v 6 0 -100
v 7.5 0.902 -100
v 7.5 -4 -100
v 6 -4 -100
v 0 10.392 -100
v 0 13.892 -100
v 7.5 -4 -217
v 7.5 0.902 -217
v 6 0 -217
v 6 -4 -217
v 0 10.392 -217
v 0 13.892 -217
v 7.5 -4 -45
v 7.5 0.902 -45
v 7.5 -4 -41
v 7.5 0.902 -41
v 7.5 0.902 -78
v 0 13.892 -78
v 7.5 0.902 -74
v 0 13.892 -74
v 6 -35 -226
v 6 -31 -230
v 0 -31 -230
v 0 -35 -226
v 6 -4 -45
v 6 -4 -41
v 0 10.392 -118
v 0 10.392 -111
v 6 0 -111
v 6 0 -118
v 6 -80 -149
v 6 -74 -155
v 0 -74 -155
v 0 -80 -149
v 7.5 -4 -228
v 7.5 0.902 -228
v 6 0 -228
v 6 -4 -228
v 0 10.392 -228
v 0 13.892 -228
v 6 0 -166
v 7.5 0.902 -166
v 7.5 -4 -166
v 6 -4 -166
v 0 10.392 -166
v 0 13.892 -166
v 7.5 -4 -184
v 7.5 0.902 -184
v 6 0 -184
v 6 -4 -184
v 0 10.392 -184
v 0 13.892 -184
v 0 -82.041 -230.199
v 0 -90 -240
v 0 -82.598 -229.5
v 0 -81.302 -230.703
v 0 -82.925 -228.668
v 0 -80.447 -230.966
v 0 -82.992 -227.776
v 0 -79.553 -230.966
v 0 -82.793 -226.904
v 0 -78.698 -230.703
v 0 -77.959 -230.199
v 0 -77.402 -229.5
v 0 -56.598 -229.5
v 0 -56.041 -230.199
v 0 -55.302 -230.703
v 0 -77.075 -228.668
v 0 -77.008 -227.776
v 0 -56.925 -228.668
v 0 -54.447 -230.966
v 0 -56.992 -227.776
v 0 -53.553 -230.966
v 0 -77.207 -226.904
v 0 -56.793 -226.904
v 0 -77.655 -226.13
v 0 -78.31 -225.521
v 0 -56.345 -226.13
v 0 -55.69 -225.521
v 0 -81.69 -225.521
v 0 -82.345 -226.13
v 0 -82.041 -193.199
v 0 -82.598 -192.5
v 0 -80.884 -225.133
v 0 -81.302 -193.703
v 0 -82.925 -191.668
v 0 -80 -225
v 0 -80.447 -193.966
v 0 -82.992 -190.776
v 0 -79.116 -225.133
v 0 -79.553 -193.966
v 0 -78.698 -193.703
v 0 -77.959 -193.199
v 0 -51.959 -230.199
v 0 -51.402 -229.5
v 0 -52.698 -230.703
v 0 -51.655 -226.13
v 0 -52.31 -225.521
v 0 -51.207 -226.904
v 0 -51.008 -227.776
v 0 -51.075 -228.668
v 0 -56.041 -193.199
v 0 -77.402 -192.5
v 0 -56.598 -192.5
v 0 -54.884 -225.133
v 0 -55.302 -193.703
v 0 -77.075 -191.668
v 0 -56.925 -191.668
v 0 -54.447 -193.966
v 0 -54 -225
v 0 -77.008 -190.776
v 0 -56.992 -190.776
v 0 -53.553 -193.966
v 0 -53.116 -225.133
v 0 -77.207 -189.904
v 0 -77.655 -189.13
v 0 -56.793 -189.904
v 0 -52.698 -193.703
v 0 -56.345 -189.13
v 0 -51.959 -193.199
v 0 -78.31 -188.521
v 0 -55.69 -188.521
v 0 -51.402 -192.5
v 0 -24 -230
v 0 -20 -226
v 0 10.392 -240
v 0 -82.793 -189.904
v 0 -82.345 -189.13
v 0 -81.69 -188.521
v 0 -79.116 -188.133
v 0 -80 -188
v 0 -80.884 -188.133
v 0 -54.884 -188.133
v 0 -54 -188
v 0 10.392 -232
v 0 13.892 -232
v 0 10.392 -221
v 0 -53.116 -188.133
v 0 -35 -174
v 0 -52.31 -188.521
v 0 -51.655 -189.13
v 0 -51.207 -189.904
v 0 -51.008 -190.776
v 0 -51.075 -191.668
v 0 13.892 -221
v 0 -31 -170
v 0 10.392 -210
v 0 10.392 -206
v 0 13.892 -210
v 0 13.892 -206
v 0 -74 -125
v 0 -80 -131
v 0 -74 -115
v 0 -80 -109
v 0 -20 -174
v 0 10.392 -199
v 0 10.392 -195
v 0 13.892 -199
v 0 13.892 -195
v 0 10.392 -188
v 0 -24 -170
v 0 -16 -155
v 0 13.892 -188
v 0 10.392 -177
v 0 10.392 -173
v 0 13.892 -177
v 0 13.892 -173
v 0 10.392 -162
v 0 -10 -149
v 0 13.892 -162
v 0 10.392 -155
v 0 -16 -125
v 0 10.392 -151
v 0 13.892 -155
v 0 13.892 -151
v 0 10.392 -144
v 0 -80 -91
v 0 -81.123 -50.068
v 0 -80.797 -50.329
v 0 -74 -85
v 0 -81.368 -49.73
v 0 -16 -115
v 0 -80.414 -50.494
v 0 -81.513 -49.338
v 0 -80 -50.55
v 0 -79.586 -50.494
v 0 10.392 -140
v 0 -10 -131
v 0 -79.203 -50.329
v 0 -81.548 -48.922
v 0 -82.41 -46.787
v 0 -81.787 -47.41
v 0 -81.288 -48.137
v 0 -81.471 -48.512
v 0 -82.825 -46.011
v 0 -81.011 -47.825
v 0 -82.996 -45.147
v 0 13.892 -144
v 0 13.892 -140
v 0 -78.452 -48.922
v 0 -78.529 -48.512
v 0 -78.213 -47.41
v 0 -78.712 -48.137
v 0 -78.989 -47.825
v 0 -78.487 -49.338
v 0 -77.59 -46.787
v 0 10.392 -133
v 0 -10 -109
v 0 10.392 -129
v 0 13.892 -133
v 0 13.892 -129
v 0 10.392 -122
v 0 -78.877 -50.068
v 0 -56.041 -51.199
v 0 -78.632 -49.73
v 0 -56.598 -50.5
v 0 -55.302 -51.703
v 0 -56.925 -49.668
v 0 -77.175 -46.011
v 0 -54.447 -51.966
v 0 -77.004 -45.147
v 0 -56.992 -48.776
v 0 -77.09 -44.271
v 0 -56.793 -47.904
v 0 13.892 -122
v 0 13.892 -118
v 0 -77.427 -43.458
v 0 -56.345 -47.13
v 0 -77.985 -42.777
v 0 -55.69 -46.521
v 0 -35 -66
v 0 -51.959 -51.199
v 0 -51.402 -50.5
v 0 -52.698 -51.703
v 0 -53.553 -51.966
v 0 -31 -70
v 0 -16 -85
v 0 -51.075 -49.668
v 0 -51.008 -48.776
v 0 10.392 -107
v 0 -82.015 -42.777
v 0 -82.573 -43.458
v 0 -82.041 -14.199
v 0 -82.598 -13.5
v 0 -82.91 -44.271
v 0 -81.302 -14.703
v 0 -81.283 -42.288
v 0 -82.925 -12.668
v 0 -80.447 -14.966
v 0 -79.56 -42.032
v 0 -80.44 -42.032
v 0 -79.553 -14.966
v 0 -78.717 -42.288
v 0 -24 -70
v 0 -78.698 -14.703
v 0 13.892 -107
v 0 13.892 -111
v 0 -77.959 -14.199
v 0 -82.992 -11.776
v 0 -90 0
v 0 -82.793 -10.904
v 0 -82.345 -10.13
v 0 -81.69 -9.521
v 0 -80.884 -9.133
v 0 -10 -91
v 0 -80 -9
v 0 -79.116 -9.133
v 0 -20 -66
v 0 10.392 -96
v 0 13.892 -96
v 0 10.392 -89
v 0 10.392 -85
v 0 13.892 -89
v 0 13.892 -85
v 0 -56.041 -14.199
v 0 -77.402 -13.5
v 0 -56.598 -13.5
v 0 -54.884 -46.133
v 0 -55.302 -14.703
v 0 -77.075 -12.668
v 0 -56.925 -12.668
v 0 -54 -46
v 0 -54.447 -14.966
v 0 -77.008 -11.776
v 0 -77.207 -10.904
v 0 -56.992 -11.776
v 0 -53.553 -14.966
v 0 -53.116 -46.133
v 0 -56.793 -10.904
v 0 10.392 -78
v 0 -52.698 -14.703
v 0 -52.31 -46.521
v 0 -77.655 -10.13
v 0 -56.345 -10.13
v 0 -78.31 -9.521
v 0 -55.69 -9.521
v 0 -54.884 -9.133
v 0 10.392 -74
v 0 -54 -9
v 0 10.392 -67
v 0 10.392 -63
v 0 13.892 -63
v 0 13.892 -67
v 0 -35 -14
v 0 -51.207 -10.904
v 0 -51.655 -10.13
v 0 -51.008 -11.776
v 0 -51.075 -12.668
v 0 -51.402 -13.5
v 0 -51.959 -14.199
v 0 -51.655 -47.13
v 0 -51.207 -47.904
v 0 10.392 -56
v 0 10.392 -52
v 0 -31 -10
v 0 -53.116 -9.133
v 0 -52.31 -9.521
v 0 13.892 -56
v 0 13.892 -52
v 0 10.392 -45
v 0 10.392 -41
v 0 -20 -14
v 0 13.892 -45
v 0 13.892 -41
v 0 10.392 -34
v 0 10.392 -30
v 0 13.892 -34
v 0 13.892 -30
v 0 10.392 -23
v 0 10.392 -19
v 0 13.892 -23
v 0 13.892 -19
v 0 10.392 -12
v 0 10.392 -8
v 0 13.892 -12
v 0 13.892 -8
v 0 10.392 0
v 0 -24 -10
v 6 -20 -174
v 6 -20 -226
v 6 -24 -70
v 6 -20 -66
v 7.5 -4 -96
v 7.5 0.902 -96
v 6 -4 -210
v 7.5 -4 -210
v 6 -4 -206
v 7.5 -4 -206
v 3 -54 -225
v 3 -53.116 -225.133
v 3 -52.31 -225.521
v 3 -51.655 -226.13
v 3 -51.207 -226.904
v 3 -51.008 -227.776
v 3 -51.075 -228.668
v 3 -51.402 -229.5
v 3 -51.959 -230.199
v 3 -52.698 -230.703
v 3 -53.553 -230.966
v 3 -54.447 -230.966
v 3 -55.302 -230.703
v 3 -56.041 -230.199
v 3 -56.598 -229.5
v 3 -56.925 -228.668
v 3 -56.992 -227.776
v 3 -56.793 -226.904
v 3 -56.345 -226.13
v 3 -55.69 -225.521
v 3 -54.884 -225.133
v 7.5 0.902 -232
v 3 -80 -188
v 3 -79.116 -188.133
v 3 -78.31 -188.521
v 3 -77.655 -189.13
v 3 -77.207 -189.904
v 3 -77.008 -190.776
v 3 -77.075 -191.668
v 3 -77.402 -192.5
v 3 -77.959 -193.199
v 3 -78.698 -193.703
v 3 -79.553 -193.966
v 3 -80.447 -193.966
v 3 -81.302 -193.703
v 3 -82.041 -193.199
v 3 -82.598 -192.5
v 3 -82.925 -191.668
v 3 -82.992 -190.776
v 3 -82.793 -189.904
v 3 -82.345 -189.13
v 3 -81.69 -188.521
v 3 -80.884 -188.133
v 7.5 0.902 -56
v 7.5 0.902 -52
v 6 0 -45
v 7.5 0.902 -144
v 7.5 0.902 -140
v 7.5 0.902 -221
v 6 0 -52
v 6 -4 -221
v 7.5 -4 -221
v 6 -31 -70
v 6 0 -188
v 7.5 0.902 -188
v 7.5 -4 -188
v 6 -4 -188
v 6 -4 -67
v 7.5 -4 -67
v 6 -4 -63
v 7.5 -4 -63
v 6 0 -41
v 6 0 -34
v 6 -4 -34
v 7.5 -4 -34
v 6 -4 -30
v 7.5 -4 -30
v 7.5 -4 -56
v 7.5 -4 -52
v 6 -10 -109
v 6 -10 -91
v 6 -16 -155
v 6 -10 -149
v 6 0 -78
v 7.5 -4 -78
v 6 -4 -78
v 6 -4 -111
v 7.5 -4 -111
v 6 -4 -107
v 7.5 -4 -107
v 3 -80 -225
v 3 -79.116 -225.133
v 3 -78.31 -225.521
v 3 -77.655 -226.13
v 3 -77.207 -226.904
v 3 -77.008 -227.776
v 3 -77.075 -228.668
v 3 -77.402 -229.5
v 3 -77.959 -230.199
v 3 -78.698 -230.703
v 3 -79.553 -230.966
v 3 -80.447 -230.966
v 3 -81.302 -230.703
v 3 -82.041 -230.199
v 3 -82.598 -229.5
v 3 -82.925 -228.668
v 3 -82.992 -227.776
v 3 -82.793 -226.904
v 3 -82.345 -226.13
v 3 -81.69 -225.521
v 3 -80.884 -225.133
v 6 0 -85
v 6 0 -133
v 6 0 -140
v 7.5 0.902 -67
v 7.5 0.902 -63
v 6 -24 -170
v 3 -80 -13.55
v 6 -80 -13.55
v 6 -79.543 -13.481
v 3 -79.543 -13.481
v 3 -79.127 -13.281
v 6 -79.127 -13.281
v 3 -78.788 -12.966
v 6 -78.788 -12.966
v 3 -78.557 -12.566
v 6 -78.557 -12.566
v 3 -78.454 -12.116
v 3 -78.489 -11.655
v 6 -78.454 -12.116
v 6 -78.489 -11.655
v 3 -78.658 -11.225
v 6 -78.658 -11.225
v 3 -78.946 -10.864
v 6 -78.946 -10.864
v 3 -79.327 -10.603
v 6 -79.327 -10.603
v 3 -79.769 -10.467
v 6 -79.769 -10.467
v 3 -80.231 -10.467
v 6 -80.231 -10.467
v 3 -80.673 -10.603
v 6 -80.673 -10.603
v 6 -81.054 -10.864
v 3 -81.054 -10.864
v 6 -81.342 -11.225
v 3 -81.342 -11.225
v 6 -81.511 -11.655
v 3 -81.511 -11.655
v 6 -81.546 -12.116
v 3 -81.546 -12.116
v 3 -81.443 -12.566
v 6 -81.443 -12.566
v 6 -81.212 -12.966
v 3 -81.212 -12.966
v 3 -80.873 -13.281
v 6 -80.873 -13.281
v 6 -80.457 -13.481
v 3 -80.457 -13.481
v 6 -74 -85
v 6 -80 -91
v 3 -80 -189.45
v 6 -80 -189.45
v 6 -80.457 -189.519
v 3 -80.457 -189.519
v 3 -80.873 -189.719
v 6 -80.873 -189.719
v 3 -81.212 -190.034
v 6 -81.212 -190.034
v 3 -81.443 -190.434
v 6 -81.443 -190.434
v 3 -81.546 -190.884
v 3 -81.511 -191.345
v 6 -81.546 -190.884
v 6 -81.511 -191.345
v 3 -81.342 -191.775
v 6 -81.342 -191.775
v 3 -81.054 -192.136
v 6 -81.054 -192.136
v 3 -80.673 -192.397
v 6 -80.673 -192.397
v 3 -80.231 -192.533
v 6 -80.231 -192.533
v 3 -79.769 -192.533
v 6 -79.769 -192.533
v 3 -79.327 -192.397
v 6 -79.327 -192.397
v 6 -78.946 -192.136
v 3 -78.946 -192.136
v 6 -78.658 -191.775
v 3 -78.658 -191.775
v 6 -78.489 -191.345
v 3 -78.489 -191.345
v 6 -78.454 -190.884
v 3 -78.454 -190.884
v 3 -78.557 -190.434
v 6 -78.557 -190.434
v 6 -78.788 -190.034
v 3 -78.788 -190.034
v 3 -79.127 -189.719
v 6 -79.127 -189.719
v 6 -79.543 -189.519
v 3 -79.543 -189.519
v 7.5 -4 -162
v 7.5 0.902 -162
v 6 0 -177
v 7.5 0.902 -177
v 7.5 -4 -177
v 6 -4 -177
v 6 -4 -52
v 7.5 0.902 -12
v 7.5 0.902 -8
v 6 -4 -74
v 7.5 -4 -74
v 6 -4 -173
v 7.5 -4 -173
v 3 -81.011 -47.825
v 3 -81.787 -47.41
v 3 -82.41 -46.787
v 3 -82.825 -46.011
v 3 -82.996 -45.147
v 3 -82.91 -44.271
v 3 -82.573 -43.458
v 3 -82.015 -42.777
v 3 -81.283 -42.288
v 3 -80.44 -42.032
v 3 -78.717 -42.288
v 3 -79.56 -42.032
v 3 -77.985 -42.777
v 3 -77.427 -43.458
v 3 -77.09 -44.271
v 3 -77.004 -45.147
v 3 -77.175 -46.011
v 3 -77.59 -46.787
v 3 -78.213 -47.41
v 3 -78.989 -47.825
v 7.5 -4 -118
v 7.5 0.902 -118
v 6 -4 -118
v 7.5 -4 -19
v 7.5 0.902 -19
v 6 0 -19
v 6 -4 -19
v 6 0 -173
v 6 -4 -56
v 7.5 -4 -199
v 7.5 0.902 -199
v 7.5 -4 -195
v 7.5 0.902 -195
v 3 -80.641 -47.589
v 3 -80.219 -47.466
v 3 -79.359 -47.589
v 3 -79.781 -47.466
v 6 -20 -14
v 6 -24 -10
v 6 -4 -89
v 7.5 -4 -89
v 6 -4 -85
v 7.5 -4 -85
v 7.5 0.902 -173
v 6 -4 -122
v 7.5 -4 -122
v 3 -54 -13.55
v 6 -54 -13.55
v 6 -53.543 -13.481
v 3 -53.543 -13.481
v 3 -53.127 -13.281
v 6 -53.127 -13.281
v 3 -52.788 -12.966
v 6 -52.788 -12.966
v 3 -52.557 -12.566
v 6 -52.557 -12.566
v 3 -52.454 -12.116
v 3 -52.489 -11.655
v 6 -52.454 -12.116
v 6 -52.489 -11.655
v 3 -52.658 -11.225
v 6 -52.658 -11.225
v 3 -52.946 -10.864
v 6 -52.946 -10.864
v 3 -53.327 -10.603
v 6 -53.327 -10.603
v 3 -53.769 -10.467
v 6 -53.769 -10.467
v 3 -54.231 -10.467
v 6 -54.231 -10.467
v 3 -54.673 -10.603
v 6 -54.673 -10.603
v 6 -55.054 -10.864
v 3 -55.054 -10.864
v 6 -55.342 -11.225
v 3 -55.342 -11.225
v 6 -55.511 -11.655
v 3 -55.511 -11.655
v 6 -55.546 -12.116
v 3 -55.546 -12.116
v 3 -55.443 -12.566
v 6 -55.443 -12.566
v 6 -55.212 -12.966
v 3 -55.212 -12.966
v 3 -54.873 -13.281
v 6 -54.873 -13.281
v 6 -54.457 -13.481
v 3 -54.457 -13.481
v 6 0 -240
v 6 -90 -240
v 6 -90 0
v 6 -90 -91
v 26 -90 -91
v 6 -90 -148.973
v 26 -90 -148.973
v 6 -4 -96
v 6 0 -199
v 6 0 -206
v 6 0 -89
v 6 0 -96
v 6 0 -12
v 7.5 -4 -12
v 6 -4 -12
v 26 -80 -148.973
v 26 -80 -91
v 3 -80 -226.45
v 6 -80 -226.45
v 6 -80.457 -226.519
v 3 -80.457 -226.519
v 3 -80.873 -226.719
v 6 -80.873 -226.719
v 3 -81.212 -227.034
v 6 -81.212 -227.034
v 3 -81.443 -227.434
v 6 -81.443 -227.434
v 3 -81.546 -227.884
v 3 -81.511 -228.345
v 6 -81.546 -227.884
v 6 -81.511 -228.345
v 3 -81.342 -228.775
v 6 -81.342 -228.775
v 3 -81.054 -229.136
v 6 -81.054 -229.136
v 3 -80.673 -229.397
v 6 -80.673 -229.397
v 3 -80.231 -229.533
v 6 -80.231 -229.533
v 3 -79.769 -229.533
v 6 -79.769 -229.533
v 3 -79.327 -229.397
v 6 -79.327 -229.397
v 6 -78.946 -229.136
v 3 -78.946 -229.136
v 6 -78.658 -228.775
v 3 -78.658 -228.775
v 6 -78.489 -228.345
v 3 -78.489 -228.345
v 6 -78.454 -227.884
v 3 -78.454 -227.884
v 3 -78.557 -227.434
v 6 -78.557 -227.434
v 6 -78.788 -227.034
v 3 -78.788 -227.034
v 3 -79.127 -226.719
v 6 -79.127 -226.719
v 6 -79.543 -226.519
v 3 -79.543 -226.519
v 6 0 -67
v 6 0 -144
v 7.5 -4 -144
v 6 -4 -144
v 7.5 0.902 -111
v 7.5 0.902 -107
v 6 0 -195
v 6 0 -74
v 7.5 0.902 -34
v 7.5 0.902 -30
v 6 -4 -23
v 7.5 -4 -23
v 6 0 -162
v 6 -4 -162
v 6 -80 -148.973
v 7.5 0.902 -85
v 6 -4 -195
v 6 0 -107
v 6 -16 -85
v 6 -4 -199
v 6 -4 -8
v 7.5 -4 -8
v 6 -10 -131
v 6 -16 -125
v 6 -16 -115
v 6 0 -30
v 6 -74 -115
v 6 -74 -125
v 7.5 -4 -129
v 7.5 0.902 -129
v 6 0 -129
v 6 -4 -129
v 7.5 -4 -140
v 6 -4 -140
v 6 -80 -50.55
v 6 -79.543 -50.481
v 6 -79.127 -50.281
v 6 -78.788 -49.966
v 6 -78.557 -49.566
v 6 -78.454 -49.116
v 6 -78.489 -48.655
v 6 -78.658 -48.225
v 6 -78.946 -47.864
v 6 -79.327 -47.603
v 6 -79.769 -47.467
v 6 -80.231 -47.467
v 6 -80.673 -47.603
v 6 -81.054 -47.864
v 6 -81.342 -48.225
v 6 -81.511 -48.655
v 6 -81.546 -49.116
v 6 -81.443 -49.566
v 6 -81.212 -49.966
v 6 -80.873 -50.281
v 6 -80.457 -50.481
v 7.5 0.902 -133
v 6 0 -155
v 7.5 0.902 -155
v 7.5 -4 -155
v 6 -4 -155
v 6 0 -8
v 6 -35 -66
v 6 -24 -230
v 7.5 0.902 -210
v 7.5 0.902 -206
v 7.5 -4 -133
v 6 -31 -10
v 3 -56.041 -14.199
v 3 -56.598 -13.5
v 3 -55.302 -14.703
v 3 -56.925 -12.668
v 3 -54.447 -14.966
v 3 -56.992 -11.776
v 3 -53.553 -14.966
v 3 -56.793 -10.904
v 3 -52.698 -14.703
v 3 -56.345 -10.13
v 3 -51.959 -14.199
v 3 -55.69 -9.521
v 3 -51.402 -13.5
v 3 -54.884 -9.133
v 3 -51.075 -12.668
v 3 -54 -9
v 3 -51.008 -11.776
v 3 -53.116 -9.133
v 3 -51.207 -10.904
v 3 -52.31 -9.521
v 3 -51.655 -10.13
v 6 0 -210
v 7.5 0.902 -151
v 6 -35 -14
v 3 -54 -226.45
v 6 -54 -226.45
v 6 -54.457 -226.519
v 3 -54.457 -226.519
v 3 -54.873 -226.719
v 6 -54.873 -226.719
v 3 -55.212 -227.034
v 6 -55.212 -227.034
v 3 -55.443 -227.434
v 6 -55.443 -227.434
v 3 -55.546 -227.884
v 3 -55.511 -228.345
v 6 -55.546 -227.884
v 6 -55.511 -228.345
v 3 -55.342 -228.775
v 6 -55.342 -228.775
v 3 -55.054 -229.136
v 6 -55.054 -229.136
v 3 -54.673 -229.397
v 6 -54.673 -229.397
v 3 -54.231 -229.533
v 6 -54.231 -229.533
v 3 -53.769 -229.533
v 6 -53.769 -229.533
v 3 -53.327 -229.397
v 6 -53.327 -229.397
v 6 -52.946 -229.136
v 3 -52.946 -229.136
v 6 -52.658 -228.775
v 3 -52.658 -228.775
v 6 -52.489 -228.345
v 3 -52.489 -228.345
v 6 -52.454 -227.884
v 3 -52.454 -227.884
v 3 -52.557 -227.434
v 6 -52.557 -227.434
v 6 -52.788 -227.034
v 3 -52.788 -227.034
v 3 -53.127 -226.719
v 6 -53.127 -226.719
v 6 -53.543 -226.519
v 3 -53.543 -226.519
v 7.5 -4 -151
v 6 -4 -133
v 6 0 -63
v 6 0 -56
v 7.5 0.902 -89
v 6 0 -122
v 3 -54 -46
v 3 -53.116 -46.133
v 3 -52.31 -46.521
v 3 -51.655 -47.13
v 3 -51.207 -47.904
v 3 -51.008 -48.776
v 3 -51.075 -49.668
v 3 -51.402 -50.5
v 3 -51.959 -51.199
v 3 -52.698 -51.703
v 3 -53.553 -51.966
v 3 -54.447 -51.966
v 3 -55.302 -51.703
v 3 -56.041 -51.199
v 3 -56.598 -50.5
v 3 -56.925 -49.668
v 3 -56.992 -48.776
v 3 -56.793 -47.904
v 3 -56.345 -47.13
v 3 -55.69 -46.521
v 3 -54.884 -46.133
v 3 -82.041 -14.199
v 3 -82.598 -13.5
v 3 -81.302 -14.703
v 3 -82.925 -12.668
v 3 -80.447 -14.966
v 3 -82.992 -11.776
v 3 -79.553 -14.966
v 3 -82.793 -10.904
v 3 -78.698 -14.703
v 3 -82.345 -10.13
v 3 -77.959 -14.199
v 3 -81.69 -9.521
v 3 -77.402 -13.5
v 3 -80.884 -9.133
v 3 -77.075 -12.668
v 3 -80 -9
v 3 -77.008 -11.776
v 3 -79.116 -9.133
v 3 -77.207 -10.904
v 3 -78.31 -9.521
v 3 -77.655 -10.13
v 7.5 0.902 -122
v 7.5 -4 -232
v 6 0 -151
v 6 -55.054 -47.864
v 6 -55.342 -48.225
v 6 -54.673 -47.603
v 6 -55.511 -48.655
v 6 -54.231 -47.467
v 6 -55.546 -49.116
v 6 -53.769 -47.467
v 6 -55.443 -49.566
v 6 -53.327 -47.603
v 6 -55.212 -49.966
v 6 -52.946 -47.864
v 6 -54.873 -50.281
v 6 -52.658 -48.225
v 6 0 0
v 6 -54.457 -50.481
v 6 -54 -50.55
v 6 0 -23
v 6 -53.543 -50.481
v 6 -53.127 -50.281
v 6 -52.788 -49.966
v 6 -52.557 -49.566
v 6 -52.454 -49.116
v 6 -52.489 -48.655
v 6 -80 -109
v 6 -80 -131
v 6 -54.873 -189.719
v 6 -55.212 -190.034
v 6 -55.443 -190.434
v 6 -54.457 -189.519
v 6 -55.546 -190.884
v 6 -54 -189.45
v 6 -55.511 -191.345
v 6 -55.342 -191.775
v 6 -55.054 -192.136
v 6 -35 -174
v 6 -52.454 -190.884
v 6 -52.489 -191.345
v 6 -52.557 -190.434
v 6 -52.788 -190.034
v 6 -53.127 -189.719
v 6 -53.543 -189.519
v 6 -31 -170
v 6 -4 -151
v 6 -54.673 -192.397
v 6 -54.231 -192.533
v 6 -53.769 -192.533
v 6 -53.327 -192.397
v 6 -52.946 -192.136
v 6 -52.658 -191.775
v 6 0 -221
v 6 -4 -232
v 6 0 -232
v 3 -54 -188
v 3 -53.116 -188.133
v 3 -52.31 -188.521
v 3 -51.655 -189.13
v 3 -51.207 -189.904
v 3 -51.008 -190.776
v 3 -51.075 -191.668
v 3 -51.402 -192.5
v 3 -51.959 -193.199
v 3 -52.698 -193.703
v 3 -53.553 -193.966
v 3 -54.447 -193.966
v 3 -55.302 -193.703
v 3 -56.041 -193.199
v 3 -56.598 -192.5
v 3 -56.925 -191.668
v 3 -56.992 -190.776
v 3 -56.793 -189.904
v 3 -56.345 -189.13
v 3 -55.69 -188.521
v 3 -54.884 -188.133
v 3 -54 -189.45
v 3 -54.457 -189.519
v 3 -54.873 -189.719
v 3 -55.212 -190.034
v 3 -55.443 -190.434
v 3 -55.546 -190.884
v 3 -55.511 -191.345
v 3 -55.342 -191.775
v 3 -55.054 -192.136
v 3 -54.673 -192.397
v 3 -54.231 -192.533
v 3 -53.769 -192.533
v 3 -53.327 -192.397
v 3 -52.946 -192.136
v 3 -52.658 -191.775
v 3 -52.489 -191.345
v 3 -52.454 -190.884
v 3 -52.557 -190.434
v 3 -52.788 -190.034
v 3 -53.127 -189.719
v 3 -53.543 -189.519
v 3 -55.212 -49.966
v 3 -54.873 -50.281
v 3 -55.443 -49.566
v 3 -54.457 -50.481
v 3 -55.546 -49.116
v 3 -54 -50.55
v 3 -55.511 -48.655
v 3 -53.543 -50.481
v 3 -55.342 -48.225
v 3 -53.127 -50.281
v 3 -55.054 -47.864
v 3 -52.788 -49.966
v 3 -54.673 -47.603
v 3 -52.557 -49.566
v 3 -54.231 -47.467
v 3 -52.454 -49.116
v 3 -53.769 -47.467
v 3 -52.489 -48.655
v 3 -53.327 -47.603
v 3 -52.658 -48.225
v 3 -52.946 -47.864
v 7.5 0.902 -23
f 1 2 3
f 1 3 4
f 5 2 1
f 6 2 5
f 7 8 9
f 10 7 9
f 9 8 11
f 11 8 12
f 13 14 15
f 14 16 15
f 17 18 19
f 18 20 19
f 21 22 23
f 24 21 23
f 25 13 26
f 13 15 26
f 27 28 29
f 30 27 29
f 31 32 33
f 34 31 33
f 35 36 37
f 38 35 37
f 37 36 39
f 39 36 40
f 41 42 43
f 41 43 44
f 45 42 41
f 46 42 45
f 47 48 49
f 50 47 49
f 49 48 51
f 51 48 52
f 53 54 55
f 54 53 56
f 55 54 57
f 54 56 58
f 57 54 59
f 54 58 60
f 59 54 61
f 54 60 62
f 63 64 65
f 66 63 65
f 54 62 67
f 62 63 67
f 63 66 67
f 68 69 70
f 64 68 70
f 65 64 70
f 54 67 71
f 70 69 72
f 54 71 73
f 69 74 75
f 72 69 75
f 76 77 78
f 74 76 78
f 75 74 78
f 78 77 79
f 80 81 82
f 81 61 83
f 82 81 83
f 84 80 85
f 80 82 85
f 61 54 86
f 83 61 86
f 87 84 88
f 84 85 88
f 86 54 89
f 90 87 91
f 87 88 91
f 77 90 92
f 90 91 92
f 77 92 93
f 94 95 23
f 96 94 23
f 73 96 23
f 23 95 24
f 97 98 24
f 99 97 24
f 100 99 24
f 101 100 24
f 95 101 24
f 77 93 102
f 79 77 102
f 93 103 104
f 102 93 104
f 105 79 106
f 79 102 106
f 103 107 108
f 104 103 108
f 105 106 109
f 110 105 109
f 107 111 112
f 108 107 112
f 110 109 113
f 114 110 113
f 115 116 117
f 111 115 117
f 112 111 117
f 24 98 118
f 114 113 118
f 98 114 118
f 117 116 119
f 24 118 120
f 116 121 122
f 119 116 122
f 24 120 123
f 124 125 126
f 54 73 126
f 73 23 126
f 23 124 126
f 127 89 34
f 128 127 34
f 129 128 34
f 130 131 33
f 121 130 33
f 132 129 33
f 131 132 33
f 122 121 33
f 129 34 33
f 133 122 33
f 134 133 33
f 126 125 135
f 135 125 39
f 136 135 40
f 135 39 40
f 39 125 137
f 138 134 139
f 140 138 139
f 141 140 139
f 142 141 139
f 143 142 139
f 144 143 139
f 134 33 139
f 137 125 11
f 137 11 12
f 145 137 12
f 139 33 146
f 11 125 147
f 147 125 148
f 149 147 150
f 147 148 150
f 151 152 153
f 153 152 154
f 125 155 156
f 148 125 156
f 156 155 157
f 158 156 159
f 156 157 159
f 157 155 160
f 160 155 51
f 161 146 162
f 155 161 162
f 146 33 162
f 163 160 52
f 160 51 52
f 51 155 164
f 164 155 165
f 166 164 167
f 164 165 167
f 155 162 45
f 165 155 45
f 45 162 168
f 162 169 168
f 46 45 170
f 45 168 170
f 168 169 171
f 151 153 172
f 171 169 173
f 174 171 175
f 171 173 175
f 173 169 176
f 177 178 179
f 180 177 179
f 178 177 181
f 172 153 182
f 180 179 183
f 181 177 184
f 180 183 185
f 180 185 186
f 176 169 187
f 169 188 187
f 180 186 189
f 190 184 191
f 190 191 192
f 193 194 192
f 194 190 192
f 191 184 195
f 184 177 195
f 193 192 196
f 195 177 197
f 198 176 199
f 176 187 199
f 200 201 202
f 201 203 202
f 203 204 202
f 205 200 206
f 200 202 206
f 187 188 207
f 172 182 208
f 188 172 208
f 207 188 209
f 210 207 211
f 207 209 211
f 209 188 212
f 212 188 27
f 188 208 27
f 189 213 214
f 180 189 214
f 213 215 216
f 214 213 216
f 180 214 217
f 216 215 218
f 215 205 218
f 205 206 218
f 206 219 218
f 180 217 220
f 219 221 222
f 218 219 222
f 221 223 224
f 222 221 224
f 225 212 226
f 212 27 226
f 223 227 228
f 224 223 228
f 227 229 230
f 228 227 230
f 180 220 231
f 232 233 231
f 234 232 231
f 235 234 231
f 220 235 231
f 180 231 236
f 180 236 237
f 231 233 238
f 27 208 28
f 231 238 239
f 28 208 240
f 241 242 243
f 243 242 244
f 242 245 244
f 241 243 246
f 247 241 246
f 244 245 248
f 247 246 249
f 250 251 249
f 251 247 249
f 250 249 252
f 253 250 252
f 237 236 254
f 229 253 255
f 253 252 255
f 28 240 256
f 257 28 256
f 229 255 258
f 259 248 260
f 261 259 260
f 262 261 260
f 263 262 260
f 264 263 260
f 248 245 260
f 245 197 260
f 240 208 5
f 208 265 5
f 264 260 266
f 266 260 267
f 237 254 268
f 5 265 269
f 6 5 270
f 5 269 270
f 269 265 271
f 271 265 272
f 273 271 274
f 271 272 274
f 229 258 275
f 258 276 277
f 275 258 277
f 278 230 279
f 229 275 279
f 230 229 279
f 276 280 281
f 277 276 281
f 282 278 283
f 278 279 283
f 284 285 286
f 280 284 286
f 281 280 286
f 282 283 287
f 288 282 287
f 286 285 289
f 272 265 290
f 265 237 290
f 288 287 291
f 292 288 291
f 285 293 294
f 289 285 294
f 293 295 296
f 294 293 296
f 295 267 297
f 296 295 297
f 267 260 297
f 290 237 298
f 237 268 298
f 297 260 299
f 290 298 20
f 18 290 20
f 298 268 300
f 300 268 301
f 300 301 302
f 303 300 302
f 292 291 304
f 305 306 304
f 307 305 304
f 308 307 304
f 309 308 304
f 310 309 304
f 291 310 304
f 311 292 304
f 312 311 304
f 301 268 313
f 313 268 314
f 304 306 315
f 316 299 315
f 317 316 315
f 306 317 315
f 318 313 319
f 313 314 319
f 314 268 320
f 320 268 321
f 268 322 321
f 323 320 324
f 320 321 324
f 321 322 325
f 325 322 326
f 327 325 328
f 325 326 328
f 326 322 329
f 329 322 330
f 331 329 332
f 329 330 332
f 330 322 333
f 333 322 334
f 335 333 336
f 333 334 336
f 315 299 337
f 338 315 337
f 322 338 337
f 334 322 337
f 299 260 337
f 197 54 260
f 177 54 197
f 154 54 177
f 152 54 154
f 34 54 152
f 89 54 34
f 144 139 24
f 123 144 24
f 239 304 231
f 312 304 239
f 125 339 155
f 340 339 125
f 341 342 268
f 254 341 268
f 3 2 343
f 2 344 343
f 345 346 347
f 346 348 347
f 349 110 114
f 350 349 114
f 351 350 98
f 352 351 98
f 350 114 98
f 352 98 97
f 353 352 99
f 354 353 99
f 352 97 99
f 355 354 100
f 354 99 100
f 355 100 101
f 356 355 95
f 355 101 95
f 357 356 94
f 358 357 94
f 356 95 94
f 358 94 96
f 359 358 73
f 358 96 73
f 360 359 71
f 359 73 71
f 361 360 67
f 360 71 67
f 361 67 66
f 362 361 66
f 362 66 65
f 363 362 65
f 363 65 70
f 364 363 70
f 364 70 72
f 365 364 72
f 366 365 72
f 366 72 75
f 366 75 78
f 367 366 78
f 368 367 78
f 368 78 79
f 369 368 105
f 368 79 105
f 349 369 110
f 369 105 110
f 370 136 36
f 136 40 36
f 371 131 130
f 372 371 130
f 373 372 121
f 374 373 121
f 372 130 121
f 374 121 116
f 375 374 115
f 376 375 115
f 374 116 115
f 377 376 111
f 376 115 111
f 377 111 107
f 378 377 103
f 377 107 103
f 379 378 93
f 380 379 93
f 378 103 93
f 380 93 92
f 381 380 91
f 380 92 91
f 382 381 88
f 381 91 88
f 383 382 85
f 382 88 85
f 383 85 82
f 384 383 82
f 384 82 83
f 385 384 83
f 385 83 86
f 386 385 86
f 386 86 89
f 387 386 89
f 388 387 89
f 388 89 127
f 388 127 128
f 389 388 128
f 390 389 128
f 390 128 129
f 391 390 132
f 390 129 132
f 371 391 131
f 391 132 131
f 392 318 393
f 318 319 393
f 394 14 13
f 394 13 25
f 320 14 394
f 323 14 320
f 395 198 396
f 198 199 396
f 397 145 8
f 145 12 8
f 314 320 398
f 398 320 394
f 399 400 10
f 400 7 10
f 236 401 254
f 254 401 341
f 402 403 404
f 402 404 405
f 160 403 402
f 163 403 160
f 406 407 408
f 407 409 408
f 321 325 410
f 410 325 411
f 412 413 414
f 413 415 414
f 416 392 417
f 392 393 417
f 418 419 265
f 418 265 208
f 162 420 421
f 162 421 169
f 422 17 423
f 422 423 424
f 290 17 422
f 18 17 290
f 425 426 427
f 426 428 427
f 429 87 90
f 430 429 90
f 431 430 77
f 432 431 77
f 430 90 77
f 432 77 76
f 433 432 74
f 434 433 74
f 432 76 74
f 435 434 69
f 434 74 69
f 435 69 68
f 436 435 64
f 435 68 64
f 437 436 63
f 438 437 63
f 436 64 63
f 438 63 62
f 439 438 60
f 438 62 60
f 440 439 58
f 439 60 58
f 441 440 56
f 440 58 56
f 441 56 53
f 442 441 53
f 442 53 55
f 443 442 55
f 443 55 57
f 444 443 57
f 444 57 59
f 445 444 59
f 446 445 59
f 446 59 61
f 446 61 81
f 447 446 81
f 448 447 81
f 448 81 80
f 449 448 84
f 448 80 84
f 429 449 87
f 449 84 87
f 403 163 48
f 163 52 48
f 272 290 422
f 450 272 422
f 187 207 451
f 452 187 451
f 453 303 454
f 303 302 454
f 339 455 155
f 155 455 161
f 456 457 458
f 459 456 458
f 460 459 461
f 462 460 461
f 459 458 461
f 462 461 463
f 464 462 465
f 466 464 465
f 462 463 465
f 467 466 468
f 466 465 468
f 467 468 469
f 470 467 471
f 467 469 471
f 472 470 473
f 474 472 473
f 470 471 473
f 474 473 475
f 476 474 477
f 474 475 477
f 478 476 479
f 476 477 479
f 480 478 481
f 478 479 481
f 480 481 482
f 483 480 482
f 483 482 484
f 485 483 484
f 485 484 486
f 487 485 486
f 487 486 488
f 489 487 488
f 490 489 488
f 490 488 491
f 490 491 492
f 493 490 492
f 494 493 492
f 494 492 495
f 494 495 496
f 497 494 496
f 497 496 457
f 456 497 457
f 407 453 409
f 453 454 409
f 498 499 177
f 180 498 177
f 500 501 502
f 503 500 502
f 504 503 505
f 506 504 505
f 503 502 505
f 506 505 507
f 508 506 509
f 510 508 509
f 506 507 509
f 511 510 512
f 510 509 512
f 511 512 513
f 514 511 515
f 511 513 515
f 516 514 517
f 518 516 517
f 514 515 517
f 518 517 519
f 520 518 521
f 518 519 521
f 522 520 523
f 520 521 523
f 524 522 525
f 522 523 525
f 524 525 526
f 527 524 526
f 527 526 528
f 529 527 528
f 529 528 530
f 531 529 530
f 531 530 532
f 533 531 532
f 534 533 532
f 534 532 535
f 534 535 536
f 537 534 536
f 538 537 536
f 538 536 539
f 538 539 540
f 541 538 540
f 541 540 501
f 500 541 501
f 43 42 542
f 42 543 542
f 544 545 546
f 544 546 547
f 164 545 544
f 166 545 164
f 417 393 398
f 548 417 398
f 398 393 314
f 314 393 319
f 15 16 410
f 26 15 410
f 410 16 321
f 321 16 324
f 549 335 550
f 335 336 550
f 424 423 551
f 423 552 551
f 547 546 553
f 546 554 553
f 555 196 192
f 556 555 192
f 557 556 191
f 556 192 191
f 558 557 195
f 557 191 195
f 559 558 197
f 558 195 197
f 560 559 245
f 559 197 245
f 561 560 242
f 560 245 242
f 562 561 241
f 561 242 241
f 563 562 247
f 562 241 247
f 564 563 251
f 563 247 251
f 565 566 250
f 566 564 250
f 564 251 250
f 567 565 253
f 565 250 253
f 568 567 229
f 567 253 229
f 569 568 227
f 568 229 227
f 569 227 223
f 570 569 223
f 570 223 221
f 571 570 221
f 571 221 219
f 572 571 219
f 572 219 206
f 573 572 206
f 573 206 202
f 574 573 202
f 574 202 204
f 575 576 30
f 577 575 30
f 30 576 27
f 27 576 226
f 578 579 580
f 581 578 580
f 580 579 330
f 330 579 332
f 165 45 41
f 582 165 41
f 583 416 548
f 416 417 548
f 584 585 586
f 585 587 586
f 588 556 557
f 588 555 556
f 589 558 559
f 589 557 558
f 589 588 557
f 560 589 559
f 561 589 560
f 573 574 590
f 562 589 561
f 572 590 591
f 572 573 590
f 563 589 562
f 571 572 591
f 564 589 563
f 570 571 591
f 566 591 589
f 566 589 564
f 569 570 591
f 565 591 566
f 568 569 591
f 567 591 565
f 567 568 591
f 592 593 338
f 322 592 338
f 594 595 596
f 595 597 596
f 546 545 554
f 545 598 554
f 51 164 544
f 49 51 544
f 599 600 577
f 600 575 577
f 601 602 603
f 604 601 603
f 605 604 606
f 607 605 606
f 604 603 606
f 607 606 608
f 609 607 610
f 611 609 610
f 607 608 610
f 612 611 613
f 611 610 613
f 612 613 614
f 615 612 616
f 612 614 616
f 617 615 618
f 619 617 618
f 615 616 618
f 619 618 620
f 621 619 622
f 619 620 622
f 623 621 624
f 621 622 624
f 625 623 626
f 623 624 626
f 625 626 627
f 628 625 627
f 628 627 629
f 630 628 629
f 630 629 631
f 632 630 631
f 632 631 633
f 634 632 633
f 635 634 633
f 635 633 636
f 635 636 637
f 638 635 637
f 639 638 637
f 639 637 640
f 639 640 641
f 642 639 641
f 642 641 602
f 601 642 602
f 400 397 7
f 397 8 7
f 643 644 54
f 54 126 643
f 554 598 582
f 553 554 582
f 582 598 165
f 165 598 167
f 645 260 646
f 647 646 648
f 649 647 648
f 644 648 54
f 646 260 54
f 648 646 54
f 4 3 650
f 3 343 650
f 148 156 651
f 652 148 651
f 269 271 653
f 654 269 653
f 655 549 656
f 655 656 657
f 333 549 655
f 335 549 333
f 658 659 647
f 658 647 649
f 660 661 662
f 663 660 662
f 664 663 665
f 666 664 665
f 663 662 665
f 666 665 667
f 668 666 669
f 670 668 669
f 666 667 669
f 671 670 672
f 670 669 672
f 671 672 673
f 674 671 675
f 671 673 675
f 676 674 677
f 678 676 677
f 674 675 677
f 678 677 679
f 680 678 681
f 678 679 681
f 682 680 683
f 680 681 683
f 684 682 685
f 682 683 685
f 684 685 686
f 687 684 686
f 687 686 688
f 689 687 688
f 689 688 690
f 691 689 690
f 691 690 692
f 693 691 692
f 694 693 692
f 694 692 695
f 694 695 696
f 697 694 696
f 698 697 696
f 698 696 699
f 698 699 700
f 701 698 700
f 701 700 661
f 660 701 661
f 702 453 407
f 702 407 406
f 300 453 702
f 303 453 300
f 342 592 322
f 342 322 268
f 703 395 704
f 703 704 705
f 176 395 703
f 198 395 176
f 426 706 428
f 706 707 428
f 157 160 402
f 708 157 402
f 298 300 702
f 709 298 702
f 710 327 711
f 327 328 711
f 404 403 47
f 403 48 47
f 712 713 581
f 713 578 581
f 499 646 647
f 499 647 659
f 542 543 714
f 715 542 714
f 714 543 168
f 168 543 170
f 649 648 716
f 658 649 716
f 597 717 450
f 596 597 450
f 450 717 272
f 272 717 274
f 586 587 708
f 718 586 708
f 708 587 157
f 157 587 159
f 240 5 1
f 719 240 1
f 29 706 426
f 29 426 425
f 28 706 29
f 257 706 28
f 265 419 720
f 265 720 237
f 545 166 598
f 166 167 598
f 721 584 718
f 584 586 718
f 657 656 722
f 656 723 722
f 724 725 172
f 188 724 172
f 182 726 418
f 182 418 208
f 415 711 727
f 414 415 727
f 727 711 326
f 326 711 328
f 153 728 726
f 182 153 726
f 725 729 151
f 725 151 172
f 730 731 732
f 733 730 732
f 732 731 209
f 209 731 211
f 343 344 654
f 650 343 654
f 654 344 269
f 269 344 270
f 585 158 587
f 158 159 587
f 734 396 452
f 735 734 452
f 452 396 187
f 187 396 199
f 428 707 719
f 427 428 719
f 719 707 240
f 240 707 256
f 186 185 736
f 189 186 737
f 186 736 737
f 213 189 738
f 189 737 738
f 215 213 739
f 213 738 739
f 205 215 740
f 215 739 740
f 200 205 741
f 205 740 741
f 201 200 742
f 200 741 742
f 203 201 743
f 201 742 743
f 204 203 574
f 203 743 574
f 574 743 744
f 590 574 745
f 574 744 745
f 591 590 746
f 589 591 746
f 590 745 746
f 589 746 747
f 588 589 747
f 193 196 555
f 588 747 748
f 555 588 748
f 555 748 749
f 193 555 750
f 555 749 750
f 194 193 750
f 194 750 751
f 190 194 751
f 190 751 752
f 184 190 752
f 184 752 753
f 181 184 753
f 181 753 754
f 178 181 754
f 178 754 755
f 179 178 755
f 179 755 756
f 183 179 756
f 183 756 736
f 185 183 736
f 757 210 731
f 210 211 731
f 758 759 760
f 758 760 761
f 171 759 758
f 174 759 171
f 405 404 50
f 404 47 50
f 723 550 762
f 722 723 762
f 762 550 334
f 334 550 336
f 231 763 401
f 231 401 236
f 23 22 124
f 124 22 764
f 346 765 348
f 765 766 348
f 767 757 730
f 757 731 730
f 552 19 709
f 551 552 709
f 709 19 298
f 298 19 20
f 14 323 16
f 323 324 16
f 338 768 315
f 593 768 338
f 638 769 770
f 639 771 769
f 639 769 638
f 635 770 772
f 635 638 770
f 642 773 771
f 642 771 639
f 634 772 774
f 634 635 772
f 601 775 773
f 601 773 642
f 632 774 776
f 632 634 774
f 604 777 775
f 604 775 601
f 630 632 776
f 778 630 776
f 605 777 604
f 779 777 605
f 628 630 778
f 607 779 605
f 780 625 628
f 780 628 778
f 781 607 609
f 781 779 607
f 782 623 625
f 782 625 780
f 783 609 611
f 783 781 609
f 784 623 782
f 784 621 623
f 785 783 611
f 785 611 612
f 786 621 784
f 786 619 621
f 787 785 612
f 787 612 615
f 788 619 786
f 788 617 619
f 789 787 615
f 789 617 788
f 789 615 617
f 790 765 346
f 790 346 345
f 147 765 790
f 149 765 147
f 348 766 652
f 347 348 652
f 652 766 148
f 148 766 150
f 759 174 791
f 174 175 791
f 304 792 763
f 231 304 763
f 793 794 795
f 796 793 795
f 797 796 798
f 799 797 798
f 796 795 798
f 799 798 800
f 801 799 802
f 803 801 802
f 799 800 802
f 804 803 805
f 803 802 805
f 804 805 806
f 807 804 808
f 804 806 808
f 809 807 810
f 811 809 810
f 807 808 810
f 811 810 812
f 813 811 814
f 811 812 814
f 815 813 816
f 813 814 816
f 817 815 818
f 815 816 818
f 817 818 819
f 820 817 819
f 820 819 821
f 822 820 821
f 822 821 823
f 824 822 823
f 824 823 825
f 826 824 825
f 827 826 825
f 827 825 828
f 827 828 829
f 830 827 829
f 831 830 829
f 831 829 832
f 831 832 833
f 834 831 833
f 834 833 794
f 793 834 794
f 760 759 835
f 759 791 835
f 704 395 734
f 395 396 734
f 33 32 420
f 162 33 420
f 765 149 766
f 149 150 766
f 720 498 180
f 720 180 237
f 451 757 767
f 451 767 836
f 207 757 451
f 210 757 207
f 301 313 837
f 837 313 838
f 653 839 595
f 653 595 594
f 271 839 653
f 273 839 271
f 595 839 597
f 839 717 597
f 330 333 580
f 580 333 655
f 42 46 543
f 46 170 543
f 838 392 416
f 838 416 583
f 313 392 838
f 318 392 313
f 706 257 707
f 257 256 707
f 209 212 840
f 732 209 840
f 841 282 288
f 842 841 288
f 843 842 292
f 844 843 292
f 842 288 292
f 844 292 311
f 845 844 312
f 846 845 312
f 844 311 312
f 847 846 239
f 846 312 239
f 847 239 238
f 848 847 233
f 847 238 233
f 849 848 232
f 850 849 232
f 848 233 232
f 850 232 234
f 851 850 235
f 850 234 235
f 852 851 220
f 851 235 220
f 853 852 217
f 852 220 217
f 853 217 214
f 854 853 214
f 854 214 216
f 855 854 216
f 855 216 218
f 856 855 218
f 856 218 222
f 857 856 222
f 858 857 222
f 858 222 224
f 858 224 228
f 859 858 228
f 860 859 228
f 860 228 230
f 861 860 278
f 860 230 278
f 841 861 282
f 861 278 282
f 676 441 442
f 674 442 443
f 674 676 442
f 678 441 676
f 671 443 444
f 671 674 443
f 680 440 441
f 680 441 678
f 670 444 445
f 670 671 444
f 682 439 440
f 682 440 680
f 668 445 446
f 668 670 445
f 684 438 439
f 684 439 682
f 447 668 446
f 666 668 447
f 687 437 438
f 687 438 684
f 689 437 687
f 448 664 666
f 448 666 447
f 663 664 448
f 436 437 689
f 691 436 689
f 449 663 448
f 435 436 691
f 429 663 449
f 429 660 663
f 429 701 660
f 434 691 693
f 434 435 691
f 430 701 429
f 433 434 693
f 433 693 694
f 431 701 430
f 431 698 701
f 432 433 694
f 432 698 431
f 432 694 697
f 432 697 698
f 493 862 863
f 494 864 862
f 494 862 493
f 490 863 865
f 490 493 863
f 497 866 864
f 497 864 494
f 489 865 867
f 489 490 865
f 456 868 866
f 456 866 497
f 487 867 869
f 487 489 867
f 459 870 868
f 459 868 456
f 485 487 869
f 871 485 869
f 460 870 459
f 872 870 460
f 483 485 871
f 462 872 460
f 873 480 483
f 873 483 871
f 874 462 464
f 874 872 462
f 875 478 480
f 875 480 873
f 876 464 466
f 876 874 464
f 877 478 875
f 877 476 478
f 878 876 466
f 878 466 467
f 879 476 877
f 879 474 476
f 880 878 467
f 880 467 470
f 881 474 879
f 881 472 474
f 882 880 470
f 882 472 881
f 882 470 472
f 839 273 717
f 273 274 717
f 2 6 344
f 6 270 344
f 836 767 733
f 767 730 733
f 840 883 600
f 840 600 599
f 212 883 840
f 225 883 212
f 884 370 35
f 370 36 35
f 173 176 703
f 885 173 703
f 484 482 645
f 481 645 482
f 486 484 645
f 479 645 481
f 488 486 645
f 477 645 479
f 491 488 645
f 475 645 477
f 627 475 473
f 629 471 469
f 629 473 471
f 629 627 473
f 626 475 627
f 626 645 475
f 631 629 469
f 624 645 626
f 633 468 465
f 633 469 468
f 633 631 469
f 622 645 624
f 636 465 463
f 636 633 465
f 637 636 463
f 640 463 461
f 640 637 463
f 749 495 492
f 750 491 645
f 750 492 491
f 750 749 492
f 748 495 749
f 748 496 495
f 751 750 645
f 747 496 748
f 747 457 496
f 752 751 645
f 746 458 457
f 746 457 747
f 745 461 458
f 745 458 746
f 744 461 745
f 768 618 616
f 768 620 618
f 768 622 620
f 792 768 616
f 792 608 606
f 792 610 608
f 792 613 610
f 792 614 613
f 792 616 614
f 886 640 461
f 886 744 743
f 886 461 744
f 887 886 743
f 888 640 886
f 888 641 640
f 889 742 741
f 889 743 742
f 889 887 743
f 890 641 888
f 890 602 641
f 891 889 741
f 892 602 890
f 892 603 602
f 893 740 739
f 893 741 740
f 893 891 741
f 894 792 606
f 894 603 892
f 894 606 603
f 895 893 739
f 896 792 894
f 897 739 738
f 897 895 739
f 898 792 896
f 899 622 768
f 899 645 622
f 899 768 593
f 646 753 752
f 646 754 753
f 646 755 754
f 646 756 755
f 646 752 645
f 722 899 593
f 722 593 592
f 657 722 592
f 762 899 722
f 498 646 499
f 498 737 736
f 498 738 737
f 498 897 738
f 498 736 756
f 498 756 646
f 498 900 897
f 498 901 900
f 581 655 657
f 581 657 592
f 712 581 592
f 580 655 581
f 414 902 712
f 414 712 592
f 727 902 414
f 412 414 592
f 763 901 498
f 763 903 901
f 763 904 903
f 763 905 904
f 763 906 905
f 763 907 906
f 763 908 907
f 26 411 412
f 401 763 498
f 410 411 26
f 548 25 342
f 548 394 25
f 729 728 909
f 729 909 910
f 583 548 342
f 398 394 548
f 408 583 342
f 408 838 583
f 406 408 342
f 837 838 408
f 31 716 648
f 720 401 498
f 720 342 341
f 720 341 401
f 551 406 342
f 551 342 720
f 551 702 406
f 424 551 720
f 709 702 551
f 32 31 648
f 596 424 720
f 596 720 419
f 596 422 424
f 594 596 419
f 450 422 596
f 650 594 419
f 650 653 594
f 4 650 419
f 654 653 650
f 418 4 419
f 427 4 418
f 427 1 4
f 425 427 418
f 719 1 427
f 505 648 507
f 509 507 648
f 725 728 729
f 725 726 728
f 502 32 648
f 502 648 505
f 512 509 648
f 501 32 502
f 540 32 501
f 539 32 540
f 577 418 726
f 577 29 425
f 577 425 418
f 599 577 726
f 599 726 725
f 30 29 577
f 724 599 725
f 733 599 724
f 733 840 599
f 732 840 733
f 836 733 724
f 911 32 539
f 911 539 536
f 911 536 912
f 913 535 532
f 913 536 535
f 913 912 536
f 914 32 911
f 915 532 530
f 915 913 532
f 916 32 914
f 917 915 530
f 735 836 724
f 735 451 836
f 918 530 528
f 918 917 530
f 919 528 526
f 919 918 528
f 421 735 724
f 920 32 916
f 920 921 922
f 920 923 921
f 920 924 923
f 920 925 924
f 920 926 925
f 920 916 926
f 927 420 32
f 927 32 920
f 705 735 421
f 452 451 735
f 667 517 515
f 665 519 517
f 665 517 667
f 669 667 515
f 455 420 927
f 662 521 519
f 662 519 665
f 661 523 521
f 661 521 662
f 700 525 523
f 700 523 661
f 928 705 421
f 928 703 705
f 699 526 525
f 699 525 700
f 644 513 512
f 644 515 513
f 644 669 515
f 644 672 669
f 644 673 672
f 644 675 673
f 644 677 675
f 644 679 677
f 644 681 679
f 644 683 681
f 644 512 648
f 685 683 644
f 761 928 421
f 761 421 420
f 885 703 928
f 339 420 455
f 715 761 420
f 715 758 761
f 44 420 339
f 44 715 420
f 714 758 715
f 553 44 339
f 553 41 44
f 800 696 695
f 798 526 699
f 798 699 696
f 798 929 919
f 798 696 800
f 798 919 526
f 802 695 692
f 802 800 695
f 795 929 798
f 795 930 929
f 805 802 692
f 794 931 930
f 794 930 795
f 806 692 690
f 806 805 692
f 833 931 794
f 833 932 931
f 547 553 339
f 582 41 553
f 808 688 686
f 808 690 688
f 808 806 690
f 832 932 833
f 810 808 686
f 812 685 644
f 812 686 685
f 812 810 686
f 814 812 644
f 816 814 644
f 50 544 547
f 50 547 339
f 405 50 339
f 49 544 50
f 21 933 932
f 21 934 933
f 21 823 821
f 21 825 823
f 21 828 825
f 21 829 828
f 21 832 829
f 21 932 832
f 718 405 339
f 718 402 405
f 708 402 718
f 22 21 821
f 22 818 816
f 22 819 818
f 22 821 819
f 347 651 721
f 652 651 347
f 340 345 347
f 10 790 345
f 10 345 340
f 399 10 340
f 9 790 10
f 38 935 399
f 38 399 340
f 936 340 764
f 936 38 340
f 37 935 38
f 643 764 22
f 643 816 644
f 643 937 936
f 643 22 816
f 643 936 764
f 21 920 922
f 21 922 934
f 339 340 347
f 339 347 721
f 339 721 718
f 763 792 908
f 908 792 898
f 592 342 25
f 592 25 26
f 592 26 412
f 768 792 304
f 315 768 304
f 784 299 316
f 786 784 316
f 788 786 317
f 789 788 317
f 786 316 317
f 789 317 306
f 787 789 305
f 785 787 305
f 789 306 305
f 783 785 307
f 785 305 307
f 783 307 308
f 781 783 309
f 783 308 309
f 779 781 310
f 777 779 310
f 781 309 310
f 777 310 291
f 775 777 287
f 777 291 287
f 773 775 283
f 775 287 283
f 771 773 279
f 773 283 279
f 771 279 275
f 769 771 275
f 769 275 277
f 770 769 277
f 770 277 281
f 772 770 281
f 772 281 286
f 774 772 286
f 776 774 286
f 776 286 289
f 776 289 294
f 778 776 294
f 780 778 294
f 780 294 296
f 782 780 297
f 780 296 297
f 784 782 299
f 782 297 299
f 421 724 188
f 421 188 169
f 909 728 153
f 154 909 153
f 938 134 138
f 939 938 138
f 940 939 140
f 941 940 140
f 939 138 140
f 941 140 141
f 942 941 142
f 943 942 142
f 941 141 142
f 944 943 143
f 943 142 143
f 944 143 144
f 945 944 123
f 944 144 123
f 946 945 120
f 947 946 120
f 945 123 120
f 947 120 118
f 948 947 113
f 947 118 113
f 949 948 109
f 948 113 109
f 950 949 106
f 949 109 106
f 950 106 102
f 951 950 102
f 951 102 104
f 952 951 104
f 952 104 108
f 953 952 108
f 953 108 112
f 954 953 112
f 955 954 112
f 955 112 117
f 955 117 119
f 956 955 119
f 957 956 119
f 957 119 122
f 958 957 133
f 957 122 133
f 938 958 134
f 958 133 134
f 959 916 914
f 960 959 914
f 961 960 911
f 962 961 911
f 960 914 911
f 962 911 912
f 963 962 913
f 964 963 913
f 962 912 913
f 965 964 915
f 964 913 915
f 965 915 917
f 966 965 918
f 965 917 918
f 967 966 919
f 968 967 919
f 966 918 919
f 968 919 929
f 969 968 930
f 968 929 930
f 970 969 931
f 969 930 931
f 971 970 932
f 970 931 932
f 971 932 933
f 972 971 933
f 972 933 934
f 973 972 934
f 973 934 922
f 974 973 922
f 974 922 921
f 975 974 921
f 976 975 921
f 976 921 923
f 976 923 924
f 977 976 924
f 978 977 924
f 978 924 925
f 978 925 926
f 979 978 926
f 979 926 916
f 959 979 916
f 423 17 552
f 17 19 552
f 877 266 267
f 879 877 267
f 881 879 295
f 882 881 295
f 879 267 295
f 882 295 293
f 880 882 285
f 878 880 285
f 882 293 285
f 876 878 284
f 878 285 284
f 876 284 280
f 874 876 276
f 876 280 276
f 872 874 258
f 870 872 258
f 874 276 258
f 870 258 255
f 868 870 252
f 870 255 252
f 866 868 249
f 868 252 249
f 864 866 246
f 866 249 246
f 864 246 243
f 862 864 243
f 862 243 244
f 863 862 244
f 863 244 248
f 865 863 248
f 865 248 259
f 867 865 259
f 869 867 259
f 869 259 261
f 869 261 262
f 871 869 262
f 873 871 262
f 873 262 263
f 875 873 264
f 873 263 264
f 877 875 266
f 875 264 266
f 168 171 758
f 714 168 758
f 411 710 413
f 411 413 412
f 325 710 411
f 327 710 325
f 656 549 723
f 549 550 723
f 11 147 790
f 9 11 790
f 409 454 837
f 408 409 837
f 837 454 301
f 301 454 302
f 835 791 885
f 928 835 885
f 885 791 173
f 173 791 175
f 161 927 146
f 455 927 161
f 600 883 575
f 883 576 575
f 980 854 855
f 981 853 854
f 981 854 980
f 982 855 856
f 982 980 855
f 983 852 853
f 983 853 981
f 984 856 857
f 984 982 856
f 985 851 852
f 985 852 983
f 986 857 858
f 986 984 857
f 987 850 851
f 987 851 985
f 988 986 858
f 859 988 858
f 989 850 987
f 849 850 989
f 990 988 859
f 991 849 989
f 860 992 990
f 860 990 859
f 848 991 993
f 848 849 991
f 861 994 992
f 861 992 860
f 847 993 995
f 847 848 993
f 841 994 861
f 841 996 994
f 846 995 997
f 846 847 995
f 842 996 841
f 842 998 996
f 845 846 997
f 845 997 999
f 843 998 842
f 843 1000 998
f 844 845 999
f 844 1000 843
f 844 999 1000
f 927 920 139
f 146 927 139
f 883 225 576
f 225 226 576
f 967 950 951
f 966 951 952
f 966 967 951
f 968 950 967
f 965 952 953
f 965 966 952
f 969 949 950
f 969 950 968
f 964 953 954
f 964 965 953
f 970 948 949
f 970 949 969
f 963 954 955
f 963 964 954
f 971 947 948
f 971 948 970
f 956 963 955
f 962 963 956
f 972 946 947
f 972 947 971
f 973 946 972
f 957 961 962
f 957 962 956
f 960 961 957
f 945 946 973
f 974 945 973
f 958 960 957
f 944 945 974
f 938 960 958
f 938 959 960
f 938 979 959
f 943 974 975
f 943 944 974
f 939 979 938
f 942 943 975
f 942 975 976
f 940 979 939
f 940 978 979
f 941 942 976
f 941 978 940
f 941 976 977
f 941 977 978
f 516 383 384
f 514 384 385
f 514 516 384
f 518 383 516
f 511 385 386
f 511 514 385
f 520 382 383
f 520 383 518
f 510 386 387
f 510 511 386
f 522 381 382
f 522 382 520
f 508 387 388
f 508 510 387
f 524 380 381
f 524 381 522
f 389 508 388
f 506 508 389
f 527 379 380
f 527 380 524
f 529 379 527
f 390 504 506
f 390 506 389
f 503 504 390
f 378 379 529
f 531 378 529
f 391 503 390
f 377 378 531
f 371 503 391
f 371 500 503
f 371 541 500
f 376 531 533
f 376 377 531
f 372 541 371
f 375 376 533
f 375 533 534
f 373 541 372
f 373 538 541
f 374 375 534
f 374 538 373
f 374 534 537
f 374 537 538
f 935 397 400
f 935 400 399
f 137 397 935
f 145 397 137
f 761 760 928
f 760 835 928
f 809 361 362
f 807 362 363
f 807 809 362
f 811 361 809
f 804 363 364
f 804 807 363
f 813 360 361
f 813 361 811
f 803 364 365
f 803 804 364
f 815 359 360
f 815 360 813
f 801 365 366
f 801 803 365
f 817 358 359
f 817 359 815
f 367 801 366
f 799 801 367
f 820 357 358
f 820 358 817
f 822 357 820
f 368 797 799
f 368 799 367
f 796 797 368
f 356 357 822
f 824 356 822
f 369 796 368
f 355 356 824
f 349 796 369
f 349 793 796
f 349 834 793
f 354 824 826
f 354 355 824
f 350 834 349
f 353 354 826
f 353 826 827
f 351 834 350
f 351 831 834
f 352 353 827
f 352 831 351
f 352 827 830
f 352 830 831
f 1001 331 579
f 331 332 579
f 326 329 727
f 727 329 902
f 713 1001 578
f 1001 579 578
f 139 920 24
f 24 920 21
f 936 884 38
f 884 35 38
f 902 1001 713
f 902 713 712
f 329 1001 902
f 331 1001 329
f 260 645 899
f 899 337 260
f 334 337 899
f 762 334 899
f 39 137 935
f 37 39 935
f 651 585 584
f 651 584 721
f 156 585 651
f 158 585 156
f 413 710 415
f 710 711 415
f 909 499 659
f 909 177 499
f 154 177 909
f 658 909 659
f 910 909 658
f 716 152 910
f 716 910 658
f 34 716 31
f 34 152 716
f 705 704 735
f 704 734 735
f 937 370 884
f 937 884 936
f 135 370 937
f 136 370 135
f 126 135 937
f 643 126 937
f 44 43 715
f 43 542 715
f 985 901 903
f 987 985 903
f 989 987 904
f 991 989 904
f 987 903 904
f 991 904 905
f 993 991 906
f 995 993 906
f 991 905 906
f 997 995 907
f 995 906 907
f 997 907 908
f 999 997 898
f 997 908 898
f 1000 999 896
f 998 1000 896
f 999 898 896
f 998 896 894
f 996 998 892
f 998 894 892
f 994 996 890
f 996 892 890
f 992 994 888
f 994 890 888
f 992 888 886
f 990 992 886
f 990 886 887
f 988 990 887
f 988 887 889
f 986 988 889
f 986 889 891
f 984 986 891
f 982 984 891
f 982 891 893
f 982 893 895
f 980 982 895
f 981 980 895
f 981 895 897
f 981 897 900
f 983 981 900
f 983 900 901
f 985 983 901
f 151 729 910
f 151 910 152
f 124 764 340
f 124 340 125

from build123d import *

# Parameters (mm, degrees)
SKETCH_1_W                 = 240
SKETCH_1_H                 = 90
EXTRUDE_1_DEPTH            = 6
SKETCH_2_R                 = 1.55
CUT_EXTRUDE_1_DEPTH        = 257.390327431
SKETCH_3_W                 = 60
SKETCH_3_H                 = 15
CUT_EXTRUDE_2_DEPTH        = 257.390327431
SKETCH_4_W                 = 30
SKETCH_4_H                 = 70
CUT_EXTRUDE_3_DEPTH        = 257.390327431
SKETCH_5_R                 = 3
CUT_EXTRUDE_4_DEPTH        = 3
EXTRUDE_2_DEPTH            = 240
CHAMFER_1_SIZE             = 4
CHAMFER_2_SIZE             = 6
EXTRUDE_3_DEPTH            = 2
PATTERN_LINEAR_1_COUNT     = 11
PATTERN_LINEAR_1_PITCH     = 11
PATTERN_LINEAR_1_COL_COUNT = 11
PATTERN_LINEAR_1_COL_PITCH = 11
SKETCH_9_W                 = 57.973194975
SKETCH_9_H                 = 10
EXTRUDE_4_DEPTH            = 20


with BuildPart() as part:
    # 草图1 → 凸台-拉伸1 (new body)
    with BuildSketch(Plane(origin=(0, 0, 0), x_dir=(0, 0, -1), z_dir=(1, 0, 0))):
        with Locations((120, -45)):
            Rectangle(SKETCH_1_W, SKETCH_1_H)
    extrude(amount=EXTRUDE_1_DEPTH)

    # 草图2 → 切除-拉伸1 (cut, through all)
    with BuildSketch(Plane(origin=(6, 0, 0), x_dir=(0, 0, -1), z_dir=(1, 0, 0))):
        with Locations((12, -54)):
            Circle(SKETCH_2_R)
        with Locations((49, -80)):
            Circle(SKETCH_2_R)
        with Locations((49, -54)):
            Circle(SKETCH_2_R)
        with Locations((12, -80)):
            Circle(SKETCH_2_R)
        with Locations(Location((228, -80, 0), (0, 0, 180))):
            Circle(SKETCH_2_R)
        with Locations(Location((191, -54, 0), (0, 0, 180))):
            Circle(SKETCH_2_R)
        with Locations(Location((191, -80, 0), (0, 0, 180))):
            Circle(SKETCH_2_R)
        with Locations(Location((228, -54, 0), (0, 0, 180))):
            Circle(SKETCH_2_R)
    extrude(amount=-CUT_EXTRUDE_1_DEPTH, mode=Mode.SUBTRACT)

    # 草图3 → 切除-拉伸2 (cut, through all)
    with BuildSketch(Plane(origin=(6, 0, 0), x_dir=(0, 0, -1), z_dir=(1, 0, 0))):
        with Locations((40, -27.5)):
            Rectangle(SKETCH_3_W, SKETCH_3_H)
        with Locations((200, -27.5)):
            Rectangle(SKETCH_3_W, SKETCH_3_H)
    extrude(amount=-CUT_EXTRUDE_2_DEPTH, mode=Mode.SUBTRACT)

    # 草图4 → 切除-拉伸3 (cut, through all)
    with BuildSketch(Plane(origin=(6, 0, 0), x_dir=(0, 0, -1), z_dir=(1, 0, 0))):
        with Locations((100, -45)):
            Rectangle(SKETCH_4_W, SKETCH_4_H)
        with Locations((140, -45)):
            Rectangle(SKETCH_4_W, SKETCH_4_H)
    extrude(amount=-CUT_EXTRUDE_3_DEPTH, mode=Mode.SUBTRACT)

    # 草图5 → 切除-拉伸4 (cut)
    with BuildSketch(Plane.ZY):
        with Locations((-191, -80)):
            Circle(SKETCH_5_R)
        with Locations((-228, -80)):
            Circle(SKETCH_5_R)
        with Locations((-191, -54)):
            Circle(SKETCH_5_R)
        with Locations((-228, -54)):
            Circle(SKETCH_5_R)
        with Locations((-45, -80)):
            Circle(SKETCH_5_R)
        with Locations((-12, -80)):
            Circle(SKETCH_5_R)
        with Locations((-12, -54)):
            Circle(SKETCH_5_R)
        with Locations((-49, -54)):
            Circle(SKETCH_5_R)
    extrude(amount=-CUT_EXTRUDE_4_DEPTH, mode=Mode.SUBTRACT)

    # 草图6 → 凸台-拉伸2 (add)
    with BuildSketch(Plane.XY):
        Polygon((6, 0), (0, 0), (0, 10.392304845), align=None)
    extrude(amount=-EXTRUDE_2_DEPTH)

    # 倒角1
    chamfer_1_edges = [part.edges().sort_by_distance(p)[0] for p in [
        (3, -35, -10),
        (3, -20, -10),
        (3, -20, -70),
        (3, -35, -70),
        (3, -20, -170),
        (3, -20, -230),
        (3, -35, -230),
        (3, -35, -170),
    ]]
    chamfer(chamfer_1_edges, length=CHAMFER_1_SIZE)

    # 倒角2
    chamfer_2_edges = [part.edges().sort_by_distance(p)[0] for p in [
        (3, -10, -115),
        (3, -80, -115),
        (3, -80, -85),
        (3, -10, -85),
        (3, -10, -125),
        (3, -10, -155),
        (3, -80, -155),
        (3, -80, -125),
    ]]
    chamfer(chamfer_2_edges, length=CHAMFER_2_SIZE)

    # 草图8 → 凸台-拉伸3 (add, symmetric)
    with BuildSketch(Plane.XY.offset(-120)):
        Polygon((0, 10.392304845), (0, 13.892304845), (7.5, 0.901923789), (7.5, -4), (6, -4), (6, 0), align=None)
    extrude_3 = extrude(amount=EXTRUDE_3_DEPTH, both=True)

    # 阵列(线性)1: 凸台-拉伸3 ×11
    with Locations(*[(0, 0, i * PATTERN_LINEAR_1_PITCH) for i in range(1, PATTERN_LINEAR_1_COUNT)]):
        add(extrude_3)

    # 阵列(线性)1 col: 凸台-拉伸3 ×11
    with Locations(*[(0, 0, -i * PATTERN_LINEAR_1_COL_PITCH) for i in range(1, PATTERN_LINEAR_1_COL_COUNT)]):
        add(extrude_3)

    # 草图9 → 凸台-拉伸4 (add)
    with BuildSketch(Plane(origin=(6, 0, 0), x_dir=(0, 0, -1), z_dir=(1, 0, 0))):
        with Locations((119.986597488, -85)):
            Rectangle(SKETCH_9_W, SKETCH_9_H)
    extrude(amount=EXTRUDE_4_DEPTH)


solid = part.part
